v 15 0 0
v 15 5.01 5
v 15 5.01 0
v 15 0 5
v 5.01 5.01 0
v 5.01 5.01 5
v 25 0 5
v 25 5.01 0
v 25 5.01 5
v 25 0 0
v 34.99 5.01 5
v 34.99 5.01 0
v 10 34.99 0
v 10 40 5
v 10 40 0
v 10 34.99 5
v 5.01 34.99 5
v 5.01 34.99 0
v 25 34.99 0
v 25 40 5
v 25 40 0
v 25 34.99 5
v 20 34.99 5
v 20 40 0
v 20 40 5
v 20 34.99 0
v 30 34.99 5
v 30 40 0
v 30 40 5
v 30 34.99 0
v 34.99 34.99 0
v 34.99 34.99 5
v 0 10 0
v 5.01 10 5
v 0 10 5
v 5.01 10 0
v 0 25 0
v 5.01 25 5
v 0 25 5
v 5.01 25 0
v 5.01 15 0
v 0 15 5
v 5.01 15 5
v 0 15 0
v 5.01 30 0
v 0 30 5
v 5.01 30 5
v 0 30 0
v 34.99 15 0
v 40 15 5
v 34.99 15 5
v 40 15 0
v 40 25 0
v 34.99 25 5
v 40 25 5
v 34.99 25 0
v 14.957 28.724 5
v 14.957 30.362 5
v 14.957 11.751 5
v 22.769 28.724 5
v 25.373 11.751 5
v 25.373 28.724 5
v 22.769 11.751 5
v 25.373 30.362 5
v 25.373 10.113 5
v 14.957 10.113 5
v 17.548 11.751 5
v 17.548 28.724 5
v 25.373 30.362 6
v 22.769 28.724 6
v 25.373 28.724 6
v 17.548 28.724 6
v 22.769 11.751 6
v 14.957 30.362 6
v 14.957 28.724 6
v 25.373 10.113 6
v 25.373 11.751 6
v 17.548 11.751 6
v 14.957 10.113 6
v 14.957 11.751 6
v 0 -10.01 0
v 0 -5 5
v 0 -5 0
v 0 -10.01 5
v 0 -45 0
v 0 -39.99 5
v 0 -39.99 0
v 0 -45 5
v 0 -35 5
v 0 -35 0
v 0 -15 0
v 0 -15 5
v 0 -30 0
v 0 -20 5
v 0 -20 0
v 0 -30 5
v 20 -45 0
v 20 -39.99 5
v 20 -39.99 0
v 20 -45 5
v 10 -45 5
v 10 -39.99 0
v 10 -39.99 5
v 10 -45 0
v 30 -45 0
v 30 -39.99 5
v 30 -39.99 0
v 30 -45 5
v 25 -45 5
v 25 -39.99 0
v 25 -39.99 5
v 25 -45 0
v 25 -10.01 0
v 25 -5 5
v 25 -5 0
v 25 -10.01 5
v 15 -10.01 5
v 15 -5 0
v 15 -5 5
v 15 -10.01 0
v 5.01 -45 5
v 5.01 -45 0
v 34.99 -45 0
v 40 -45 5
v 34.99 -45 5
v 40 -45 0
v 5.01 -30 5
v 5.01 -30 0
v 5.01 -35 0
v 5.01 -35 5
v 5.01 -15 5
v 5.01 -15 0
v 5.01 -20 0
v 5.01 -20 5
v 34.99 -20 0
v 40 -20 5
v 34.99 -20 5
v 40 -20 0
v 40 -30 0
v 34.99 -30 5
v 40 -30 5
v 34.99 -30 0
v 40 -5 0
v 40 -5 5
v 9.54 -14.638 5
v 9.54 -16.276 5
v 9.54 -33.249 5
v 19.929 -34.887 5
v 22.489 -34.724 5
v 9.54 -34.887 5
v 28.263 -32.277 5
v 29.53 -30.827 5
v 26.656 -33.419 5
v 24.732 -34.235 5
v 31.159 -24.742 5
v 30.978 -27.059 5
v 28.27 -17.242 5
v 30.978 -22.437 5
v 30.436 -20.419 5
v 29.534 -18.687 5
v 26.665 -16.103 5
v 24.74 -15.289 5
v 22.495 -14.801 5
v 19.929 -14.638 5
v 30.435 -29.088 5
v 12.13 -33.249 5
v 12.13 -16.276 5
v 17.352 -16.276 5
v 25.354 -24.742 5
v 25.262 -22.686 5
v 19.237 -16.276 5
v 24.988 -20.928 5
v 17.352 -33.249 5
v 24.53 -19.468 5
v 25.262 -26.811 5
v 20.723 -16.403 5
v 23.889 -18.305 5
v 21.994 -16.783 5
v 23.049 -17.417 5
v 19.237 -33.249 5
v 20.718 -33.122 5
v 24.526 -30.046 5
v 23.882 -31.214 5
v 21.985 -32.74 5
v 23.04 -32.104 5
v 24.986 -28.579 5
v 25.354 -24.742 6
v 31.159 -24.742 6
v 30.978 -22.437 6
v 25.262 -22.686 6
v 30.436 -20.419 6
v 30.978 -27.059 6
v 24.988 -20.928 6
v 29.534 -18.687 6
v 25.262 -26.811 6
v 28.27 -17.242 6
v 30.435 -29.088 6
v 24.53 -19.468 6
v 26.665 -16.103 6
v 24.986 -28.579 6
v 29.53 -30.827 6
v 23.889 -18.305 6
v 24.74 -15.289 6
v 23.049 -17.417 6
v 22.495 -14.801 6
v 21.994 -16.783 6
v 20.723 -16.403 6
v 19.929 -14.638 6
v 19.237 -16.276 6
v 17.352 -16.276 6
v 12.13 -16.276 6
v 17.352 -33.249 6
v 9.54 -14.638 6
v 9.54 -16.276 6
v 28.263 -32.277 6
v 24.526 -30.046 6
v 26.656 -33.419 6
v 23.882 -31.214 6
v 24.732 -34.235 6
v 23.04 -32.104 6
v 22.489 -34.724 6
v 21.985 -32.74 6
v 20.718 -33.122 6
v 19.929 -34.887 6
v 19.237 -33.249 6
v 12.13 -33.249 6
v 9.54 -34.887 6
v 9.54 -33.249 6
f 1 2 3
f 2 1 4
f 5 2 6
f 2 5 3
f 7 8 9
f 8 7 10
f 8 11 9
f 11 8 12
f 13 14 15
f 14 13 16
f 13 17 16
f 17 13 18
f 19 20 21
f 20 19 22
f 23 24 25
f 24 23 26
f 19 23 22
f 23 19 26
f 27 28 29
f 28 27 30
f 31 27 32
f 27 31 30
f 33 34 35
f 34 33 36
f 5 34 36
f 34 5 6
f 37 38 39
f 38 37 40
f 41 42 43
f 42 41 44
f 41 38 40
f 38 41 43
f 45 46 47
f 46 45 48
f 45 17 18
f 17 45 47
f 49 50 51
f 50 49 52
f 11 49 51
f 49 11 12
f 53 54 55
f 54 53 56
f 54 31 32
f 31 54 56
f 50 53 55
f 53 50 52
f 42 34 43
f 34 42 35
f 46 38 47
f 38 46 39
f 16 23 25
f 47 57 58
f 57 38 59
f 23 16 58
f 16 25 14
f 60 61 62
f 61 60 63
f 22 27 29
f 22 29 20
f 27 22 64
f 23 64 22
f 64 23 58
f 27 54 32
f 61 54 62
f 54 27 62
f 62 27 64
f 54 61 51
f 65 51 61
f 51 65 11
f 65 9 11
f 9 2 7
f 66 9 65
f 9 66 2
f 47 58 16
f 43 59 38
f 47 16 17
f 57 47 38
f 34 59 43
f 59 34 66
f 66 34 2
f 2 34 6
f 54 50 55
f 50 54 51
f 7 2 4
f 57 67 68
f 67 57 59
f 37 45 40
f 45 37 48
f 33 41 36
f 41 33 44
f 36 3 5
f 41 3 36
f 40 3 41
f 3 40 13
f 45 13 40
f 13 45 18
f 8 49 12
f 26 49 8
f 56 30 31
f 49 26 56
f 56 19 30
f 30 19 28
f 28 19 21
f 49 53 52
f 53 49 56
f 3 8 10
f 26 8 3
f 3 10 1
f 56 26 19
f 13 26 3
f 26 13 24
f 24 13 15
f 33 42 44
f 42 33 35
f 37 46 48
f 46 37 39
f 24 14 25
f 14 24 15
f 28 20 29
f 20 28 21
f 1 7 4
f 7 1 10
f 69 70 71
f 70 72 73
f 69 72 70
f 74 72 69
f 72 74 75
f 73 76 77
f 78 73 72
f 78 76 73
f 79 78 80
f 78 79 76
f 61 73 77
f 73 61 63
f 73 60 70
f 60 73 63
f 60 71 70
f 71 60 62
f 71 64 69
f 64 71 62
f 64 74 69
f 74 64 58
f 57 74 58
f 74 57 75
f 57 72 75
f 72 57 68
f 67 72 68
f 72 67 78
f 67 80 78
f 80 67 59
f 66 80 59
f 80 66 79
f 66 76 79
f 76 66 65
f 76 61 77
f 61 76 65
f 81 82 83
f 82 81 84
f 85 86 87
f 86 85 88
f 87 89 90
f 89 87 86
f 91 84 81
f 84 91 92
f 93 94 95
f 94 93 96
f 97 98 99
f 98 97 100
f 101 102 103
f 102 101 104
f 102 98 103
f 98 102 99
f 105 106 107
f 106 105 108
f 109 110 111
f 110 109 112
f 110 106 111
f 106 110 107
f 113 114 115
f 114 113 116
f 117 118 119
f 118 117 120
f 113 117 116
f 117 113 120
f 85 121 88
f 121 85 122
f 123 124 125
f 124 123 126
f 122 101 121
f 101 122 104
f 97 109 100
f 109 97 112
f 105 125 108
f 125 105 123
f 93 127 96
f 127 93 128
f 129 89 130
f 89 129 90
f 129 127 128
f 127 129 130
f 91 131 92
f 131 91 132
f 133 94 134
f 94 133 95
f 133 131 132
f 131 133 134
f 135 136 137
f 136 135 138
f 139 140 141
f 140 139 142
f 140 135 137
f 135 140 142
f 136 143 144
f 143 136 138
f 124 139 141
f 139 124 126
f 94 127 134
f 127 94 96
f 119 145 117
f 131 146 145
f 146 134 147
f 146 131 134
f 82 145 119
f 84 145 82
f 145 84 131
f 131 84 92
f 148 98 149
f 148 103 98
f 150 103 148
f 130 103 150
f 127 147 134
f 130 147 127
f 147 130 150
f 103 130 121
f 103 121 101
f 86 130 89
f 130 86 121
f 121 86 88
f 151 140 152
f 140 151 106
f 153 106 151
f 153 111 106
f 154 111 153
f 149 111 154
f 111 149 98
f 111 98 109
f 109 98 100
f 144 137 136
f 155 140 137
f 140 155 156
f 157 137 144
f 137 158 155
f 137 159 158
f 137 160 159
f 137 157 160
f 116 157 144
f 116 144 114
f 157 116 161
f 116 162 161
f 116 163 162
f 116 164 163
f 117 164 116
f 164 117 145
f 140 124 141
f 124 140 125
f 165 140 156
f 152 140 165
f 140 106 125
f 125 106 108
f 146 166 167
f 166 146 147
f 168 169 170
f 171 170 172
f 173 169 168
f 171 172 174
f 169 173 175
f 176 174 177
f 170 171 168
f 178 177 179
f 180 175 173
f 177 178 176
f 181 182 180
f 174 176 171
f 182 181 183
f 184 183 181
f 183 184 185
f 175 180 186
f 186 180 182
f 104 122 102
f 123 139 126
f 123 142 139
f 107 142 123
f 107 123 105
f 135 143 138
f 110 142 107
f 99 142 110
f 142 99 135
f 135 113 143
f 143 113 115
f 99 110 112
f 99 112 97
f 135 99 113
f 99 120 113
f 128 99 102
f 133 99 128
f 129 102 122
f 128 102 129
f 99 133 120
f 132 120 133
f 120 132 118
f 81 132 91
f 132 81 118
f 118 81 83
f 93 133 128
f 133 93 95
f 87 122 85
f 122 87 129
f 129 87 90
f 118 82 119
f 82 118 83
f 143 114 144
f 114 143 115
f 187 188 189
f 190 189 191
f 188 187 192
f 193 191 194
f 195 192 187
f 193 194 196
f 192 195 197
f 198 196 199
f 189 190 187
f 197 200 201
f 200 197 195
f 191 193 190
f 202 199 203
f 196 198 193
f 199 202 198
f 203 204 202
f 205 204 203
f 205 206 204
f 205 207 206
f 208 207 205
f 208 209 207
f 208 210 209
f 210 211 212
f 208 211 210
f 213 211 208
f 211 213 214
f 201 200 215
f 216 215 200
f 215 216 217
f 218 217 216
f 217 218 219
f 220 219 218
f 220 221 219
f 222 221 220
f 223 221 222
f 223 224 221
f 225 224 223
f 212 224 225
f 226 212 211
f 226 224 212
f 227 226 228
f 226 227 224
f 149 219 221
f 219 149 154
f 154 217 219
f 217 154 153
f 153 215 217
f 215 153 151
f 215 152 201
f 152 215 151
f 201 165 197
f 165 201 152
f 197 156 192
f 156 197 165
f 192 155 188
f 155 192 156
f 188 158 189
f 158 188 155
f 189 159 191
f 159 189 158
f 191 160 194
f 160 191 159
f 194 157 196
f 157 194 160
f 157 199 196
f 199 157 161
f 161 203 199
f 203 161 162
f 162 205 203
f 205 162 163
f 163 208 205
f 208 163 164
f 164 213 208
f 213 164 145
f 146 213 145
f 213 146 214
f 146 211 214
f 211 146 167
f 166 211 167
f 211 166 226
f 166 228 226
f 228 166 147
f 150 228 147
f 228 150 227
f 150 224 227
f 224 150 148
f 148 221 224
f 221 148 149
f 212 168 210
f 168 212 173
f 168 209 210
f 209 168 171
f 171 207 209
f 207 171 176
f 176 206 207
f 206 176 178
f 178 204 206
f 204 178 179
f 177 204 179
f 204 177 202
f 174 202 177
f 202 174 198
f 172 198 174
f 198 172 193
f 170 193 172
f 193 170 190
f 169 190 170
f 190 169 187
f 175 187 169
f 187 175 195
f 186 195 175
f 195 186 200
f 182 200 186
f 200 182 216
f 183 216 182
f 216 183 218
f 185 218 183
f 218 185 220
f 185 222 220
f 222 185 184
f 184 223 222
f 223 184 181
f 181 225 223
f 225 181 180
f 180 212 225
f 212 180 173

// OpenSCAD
// [What to Print]
WhatToPrint=7; // [0:All 6, 1,2,3,4,5,6, 7:Test Fit just 2 pieces]

//[Dimensions]
// the overall size. The square area available to write on
X=30; //[10:50]
// The size of the tabs that fit together (also overall thickness)
Y=5; // [1:10]
// The gap so that pieces will fit together, this depends on the printer
gap=0.4; // [0.00:0:05:1.00]

//[Text]
// You can use Help menu Font List to see what is available
// the word "style" is case sensitive, the other words are not
// whitespace does not seem to matter
font="Caladea:style= bold";

// These do not have to be single letters, you can print words, 
// but then you have to reduce the font size so that they fit
text1="I";
text1_size=20;
text2="D";
text2_size=20;
text3="I";
text3_size=20;
text4="G";
text4_size=20;
text5="3";
text5_size=20;
text6="D";
text6_size=20;

//[Hidden]
$fn=25;
small=0.01;
K1=(X+2*Y)/8;
K2=(X+2*Y)*2/8;
K3=(X+2*Y)*3/8;

module piece()
{
    cube([X+2*Y, X+2*Y,Y]);
}

module nibble(len, in=true)
{
    y=Y+2*small; // small to make sure the piece to cutout is slightly larger than what we are cutting
    
    translate([len/2,y/2-small,y/2-small])
    cube([len,y,y],center=true);


}
//!nibble(10,false);

module edge(s1,p1,s2,p2=10,s3=10, p3=10, s4=10)
{
    translate([-2,0,0])
    nibble(s1+2);
    translate([s1+p1,0,0])
    nibble(s2);
    translate([s1+p1+s2+p2,0,0])
    nibble(s3);
    translate([s1+p1+s2+p2+s3+p3,0,0])
    nibble(s4);
}
//!edge();
module matchingEdge(s1,p1,s2,p2=10,s3=10,p3=10,s4=10)
{
    s4=p3;
    p3=s3;
    s3=p2;
    p2=s2;
    s2=p1;
    p1=s1;
    s1=0;
    translate([-2,0,0])
    nibble(s1+2,false);
    translate([s1+p1,0,0])
    nibble(s2,false);
    translate([s1+p1+s2+p2,0,0])
    nibble(s3,false);
    translate([s1+p1+s2+p2+s3+p3,0,0])
    nibble(s4,false);
}

module piece1()
{ //A
        
    translate([Y+X/2, Y+X/2, Y-1])
    linear_extrude(height=2)
    text(text=text1, size=text1_size,halign="center", valign="center", font=font);
    difference()
    {
        piece();
        
        edge(K3,K2,K3+2);
        
        translate([0,Y+X,0])
        edge(K2,K2,K1,K1,K2+2);
        
        translate([Y,0,0])
        rotate([0,0,90])
        edge(K2,K1,K2,K1,K2+2);
        
        translate([2*Y+X,0,0])
        rotate([0,0,90])
        edge(K3,K2,K3+2);
    }
}

module piece1_test()
{
    
    translate([Y+X/2, Y+X/2, Y-1])
    linear_extrude(height=2)
    text(text=text2, size=text2_size,halign="center", valign="center", font=font);
    difference()
    {
        piece();

        matchingEdge(K2,K2,K1,K1,K2+2);
        
        translate([0,Y+X,0])
        matchingEdge(K3,K2,K3+2);
        
        translate([Y,0,0])
        rotate([0,0,90])
        matchingEdge(K2,K1,K2,K1,K2+2);
        
        
        translate([2*Y+X,0,0])
        rotate([0,0,90])
        matchingEdge(K3,K2,K3+2);
    }
}
module piece2()
{ //P
    translate([Y+X/2, Y+X/2, Y-1])
    linear_extrude(height=2)
    text(text=text2, size=text2_size,halign="center", valign="center", font=font);
    difference()
    {
        piece();
        
        
        edge(K2,K1,K2,K1,K2+2);
        
        translate([0,Y+X,0])
        matchingEdge(K3,K2,K3+2);
        
        translate([Y,0,0])
        rotate([0,0,90])
        edge(K2,K2,K1,K1,K2+2);
        
        translate([2*Y+X,0,0])
        rotate([0,0,90])
        edge(K3,K2,K2,K1+2);
    }
}
module piece3()
{ //E
        
    translate([Y+X/2, Y+X/2, Y-1])
    linear_extrude(height=2)
    text(text=text3, size=text3_size,halign="center", valign="center", font=font);
    
    difference()
    {
        piece();
        edge(K1,K2,K2,K1,K1+2);
        
        translate([0,Y+X,0])
        matchingEdge(K3,K2,K3+2);
        
        translate([Y,0,0])
        rotate([0,0,90])
        matchingEdge(K3,K2,K2,K1+2);
        
        translate([2*Y+X,0,0])
        rotate([0,0,90])
        edge(K1,K1,K1,K1,K1,K1,K2+2);
    }
}

module piece4()
{ //G
        
    translate([Y+X/2, Y+X/2, Y-1])
    linear_extrude(height=2)
    text(text=text4, size=text4_size,halign="center", valign="center", font=font);

    difference()
    {
        piece();
        
        edge(0,K3,K2,K3,K1,K2+2);
        
        translate([0,Y+X,0])
        matchingEdge(K2,K1,K1,K2,K1,K2+2);
        
        translate([Y,0,0])
        rotate([0,0,90])
        matchingEdge(K1,K1,K1,K1,K1,K1,K2+2);
        
        translate([2*Y+X,0,0])
        rotate([0,0,90])
        edge(0,K1,K1,K1,K2,K2,K1+2);
    }
}

module piece5()
{ //g
        
    translate([Y+X/2, Y+X/2, Y-1])
    linear_extrude(height=2)
    text(text=text5, size=text5_size,halign="center", valign="center", font=font);

    difference()
    {
        piece();
        
        edge(K3,K1,K1,K1,K1,K1+2);
        
        translate([0,Y+X,0])
        matchingEdge(K2,K1,K2,K1,K2+2);
        
        translate([Y,0,0])
        rotate([0,0,90])
        matchingEdge(0,K1,K1,K1,K2,K2,K1+2);
        
        translate([2*Y+X,0,0])
        rotate([0,0,90])
        matchingEdge(K2,K2,K1,K1,K2+2);
    }
}

module piece6()
{ //a
        
    translate([Y+X/2, Y+X/2, Y-1])
    linear_extrude(height=2)
    text(text=text6, size=text6_size,halign="center", valign="center", font=font);

    difference()
    {
        piece();
        
        matchingEdge(0,K3,K2,K3,K1,K2+2);
        
        translate([0,Y+X,0])
        matchingEdge(K2,K1,K2,K1,K2+2);
        
        translate([Y,0,0])
        rotate([0,0,90])
        matchingEdge(K3,K1,K1,K1,K1,K1+2);
        
        translate([2*Y+X,0,0])
        rotate([0,0,90])
        matchingEdge(0,K1,K1,K1,K2,K2,K1+2);
    }
}

if ((WhatToPrint==0) || (WhatToPrint==1) || (WhatToPrint==7))
piece1();

if ((WhatToPrint==7))
translate([0,-X-3*Y,0])
piece1_test();


if ((WhatToPrint==0) || (WhatToPrint==2))
translate([0,1*(-X-3*Y),0])
piece2();

if ((WhatToPrint==0) || (WhatToPrint==3))
translate([0,2*(-X-3*Y),0])
piece3();

if ((WhatToPrint==0) || (WhatToPrint==4))
translate([X+3*Y,0,0])
piece4();

if ((WhatToPrint==0) || (WhatToPrint==5))
translate([X+3*Y,1*(-X-3*Y),0])
piece5();

if ((WhatToPrint==0) || (WhatToPrint==6))
translate([X+3*Y,2*(-X-3*Y),0])
piece6();
